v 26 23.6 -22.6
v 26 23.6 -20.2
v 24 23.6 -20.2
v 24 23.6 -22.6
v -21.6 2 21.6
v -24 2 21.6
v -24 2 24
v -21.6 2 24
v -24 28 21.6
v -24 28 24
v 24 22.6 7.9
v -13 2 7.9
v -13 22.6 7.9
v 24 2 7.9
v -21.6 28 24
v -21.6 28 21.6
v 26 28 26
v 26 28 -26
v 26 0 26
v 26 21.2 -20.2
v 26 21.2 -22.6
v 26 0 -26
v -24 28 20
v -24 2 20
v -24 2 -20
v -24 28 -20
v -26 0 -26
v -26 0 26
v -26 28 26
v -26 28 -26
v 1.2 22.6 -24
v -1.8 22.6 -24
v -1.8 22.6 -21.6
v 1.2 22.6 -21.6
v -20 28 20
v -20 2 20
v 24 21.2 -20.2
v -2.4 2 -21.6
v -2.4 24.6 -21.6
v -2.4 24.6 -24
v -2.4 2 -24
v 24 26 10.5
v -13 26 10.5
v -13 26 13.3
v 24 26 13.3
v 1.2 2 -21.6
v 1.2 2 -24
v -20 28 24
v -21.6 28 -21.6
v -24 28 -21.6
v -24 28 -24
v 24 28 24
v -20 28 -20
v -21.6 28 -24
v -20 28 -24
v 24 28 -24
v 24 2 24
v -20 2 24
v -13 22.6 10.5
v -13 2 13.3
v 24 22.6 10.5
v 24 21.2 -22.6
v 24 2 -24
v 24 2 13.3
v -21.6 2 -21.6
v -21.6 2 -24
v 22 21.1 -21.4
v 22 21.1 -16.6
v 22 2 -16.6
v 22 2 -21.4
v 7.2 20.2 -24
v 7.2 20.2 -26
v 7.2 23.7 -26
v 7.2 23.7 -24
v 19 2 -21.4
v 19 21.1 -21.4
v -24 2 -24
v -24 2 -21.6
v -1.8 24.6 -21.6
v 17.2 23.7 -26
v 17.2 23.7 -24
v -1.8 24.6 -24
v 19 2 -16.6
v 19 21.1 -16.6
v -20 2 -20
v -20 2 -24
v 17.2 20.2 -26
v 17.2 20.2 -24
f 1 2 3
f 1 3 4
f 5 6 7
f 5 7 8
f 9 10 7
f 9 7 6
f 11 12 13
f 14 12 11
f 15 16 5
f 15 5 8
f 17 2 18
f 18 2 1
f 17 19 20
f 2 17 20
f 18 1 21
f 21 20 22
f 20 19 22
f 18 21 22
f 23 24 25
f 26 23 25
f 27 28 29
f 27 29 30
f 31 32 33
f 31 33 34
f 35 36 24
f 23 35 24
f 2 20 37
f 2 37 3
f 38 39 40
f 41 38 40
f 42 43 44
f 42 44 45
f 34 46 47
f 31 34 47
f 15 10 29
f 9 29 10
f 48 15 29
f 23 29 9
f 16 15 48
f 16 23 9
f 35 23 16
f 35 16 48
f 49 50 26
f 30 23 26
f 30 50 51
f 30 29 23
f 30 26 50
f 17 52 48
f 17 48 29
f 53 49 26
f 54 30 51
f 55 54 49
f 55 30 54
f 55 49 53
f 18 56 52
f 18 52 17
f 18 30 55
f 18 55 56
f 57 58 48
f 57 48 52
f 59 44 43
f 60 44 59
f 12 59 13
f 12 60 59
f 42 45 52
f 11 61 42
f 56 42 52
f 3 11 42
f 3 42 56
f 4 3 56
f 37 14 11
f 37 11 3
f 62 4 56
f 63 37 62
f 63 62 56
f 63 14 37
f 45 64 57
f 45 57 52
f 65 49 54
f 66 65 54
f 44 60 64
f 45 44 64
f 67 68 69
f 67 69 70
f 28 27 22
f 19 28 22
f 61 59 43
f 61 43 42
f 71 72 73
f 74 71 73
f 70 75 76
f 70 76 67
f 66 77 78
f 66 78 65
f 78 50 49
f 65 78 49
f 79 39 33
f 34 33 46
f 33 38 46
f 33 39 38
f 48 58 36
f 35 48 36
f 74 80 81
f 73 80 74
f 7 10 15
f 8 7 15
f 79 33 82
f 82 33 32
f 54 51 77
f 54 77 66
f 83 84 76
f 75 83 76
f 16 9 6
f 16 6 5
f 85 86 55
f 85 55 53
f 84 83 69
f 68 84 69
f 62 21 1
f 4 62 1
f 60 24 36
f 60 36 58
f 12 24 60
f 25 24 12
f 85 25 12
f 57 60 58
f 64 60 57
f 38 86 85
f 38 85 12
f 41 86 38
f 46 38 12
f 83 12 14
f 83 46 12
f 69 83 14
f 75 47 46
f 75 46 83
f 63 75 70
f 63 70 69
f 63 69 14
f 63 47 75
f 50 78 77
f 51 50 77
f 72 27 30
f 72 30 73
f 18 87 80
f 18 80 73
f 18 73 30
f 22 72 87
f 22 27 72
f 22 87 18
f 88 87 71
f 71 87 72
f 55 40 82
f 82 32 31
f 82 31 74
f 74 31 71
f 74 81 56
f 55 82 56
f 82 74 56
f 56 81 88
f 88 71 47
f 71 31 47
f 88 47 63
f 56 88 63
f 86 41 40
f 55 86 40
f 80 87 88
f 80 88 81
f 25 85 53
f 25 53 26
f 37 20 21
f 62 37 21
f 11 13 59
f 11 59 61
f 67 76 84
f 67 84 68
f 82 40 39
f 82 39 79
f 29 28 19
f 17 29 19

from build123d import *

# Parameters (mm, degrees)
SKIZZE1_W                         = 48
SKIZZE1_H                         = 48
AUFSATZ_LINEAR_AUSTRAGEN1_DEPTH   = 2
LINEAR_AUSTRAGEN_D_NN1_DEPTH      = 26
LINEAR_AUSTRAGEN_D_NN1_DEPTH_BACK = 2
SKIZZE2_W                         = 52
SKIZZE2_H                         = 52
SKIZZE2_W_2                       = 48
SKIZZE2_H_2                       = 48
SCHNITT_LINEAR_AUSTRAGEN1_REACH   = 66.529
SKIZZE4_W                         = 10
SKIZZE4_H                         = 3.5
SCHNITT_LINEAR_AUSTRAGEN2_REACH   = 66.529
SKIZZE5_W                         = 2.4
SKIZZE5_H                         = 2.4
SKIZZE6_W                         = 3
SKIZZE6_H                         = 4.8
AUFSATZ_LINEAR_AUSTRAGEN2_DEPTH   = 19.1
SKIZZE7_W                         = 3.6
SKIZZE7_H                         = 2.4
AUFSATZ_LINEAR_AUSTRAGEN3_DEPTH   = 20.6
SKIZZE8_W                         = 0.6
SKIZZE8_H                         = 2.4
AUFSATZ_LINEAR_AUSTRAGEN4_DEPTH   = 2
SKIZZE9_W                         = 37
SKIZZE9_H                         = 2.6
AUFSATZ_LINEAR_AUSTRAGEN5_DEPTH   = 20.6
AUFSATZ_LINEAR_AUSTRAGEN6_DEPTH   = 26
SKIZZE11_W                        = 37
SKIZZE11_H                        = 2.8
AUFSATZ_LINEAR_AUSTRAGEN7_DEPTH   = 24


with BuildPart() as part:
    # Skizze1 → Aufsatz-Linear austragen1 (new body)
    with BuildSketch(Plane(origin=(0, 0, 0), x_dir=(1, 0, 0), z_dir=(0, 1, 0))):
        Rectangle(SKIZZE1_W, SKIZZE1_H)
    extrude(amount=AUFSATZ_LINEAR_AUSTRAGEN1_DEPTH)

    # Skizze2 → Linear-Austragen-Dünn1 (add, two sides: drawn at the far end of the back side and taken through both)
    with BuildSketch(Plane(origin=(0, 2, 0), x_dir=(1, 0, 0), z_dir=(0, 1, 0)).offset(-LINEAR_AUSTRAGEN_D_NN1_DEPTH_BACK)):
        Rectangle(SKIZZE2_W, SKIZZE2_H)
        Rectangle(SKIZZE2_W_2, SKIZZE2_H_2, mode=Mode.SUBTRACT)
    extrude(amount=LINEAR_AUSTRAGEN_D_NN1_DEPTH + LINEAR_AUSTRAGEN_D_NN1_DEPTH_BACK)

    # Skizze4 → Schnitt-Linear austragen1 (cut, up to next)
    with BuildSketch(Plane(origin=(0, 0, -26), x_dir=(-1, 0, 0), z_dir=(0, 0, -1)), mode=Mode.PRIVATE) as schnitt_linear_austragen1_sk1:
        with Locations((-12.2, 21.95)):
            Rectangle(SKIZZE4_W, SKIZZE4_H)
    schnitt_linear_austragen1_tool1 = extrude(schnitt_linear_austragen1_sk1.sketch, amount=-SCHNITT_LINEAR_AUSTRAGEN1_REACH, mode=Mode.PRIVATE) & part.part
    add(schnitt_linear_austragen1_tool1.solids().sort_by_distance((12.2, 21.95, -26))[0], mode=Mode.SUBTRACT)

    # Skizze5 → Schnitt-Linear austragen2 (cut, up to next)
    with BuildSketch(Plane(origin=(26, 0, 0), x_dir=(0, 0, -1), z_dir=(1, 0, 0)), mode=Mode.PRIVATE) as schnitt_linear_austragen2_sk1:
        with Locations((21.4, 22.4)):
            Rectangle(SKIZZE5_W, SKIZZE5_H)
    schnitt_linear_austragen2_tool1 = extrude(schnitt_linear_austragen2_sk1.sketch, amount=-SCHNITT_LINEAR_AUSTRAGEN2_REACH, mode=Mode.PRIVATE) & part.part
    add(schnitt_linear_austragen2_tool1.solids().sort_by_distance((26, 22.4, -21.4))[0], mode=Mode.SUBTRACT)

    # Skizze6 → Aufsatz-Linear austragen2 (add)
    with BuildSketch(Plane(origin=(0, 2, 0), x_dir=(1, 0, 0), z_dir=(0, 1, 0))):
        with Locations((20.5, 19)):
            Rectangle(SKIZZE6_W, SKIZZE6_H)
    extrude(amount=AUFSATZ_LINEAR_AUSTRAGEN2_DEPTH)

    # Skizze7 → Aufsatz-Linear austragen3 (add)
    with BuildSketch(Plane(origin=(0, 2, 0), x_dir=(1, 0, 0), z_dir=(0, 1, 0))):
        with Locations((-0.6, 22.8)):
            Rectangle(SKIZZE7_W, SKIZZE7_H)
    extrude(amount=AUFSATZ_LINEAR_AUSTRAGEN3_DEPTH)

    # Skizze8 → Aufsatz-Linear austragen4 (add)
    with BuildSketch(Plane(origin=(0, 22.6, 0), x_dir=(1, 0, 0), z_dir=(0, 1, 0))):
        with Locations((-2.1, 22.8)):
            Rectangle(SKIZZE8_W, SKIZZE8_H)
    extrude(amount=AUFSATZ_LINEAR_AUSTRAGEN4_DEPTH)

    # Skizze9 → Aufsatz-Linear austragen5 (add)
    with BuildSketch(Plane(origin=(0, 2, 0), x_dir=(1, 0, 0), z_dir=(0, 1, 0))):
        with Locations((5.5, -9.2)):
            Rectangle(SKIZZE9_W, SKIZZE9_H)
    extrude(amount=AUFSATZ_LINEAR_AUSTRAGEN5_DEPTH)

    # Skizze10 → Aufsatz-Linear austragen6 (add)
    with BuildSketch(Plane(origin=(0, 2, 0), x_dir=(1, 0, 0), z_dir=(0, 1, 0))):
        Polygon((-24, 21.6), (-21.6, 21.6), (-21.6, 24), (-20, 24), (-20, 20), (-24, 20), align=None)
        Polygon((-24, -21.6), (-21.6, -21.6), (-21.6, -24), (-20, -24), (-20, -20), (-24, -20), align=None)
    extrude(amount=AUFSATZ_LINEAR_AUSTRAGEN6_DEPTH)

    # Skizze11 → Aufsatz-Linear austragen7 (add)
    with BuildSketch(Plane(origin=(0, 2, 0), x_dir=(1, 0, 0), z_dir=(0, 1, 0))):
        with Locations((5.5, -11.9)):
            Rectangle(SKIZZE11_W, SKIZZE11_H)
    extrude(amount=AUFSATZ_LINEAR_AUSTRAGEN7_DEPTH)


solid = part.part
